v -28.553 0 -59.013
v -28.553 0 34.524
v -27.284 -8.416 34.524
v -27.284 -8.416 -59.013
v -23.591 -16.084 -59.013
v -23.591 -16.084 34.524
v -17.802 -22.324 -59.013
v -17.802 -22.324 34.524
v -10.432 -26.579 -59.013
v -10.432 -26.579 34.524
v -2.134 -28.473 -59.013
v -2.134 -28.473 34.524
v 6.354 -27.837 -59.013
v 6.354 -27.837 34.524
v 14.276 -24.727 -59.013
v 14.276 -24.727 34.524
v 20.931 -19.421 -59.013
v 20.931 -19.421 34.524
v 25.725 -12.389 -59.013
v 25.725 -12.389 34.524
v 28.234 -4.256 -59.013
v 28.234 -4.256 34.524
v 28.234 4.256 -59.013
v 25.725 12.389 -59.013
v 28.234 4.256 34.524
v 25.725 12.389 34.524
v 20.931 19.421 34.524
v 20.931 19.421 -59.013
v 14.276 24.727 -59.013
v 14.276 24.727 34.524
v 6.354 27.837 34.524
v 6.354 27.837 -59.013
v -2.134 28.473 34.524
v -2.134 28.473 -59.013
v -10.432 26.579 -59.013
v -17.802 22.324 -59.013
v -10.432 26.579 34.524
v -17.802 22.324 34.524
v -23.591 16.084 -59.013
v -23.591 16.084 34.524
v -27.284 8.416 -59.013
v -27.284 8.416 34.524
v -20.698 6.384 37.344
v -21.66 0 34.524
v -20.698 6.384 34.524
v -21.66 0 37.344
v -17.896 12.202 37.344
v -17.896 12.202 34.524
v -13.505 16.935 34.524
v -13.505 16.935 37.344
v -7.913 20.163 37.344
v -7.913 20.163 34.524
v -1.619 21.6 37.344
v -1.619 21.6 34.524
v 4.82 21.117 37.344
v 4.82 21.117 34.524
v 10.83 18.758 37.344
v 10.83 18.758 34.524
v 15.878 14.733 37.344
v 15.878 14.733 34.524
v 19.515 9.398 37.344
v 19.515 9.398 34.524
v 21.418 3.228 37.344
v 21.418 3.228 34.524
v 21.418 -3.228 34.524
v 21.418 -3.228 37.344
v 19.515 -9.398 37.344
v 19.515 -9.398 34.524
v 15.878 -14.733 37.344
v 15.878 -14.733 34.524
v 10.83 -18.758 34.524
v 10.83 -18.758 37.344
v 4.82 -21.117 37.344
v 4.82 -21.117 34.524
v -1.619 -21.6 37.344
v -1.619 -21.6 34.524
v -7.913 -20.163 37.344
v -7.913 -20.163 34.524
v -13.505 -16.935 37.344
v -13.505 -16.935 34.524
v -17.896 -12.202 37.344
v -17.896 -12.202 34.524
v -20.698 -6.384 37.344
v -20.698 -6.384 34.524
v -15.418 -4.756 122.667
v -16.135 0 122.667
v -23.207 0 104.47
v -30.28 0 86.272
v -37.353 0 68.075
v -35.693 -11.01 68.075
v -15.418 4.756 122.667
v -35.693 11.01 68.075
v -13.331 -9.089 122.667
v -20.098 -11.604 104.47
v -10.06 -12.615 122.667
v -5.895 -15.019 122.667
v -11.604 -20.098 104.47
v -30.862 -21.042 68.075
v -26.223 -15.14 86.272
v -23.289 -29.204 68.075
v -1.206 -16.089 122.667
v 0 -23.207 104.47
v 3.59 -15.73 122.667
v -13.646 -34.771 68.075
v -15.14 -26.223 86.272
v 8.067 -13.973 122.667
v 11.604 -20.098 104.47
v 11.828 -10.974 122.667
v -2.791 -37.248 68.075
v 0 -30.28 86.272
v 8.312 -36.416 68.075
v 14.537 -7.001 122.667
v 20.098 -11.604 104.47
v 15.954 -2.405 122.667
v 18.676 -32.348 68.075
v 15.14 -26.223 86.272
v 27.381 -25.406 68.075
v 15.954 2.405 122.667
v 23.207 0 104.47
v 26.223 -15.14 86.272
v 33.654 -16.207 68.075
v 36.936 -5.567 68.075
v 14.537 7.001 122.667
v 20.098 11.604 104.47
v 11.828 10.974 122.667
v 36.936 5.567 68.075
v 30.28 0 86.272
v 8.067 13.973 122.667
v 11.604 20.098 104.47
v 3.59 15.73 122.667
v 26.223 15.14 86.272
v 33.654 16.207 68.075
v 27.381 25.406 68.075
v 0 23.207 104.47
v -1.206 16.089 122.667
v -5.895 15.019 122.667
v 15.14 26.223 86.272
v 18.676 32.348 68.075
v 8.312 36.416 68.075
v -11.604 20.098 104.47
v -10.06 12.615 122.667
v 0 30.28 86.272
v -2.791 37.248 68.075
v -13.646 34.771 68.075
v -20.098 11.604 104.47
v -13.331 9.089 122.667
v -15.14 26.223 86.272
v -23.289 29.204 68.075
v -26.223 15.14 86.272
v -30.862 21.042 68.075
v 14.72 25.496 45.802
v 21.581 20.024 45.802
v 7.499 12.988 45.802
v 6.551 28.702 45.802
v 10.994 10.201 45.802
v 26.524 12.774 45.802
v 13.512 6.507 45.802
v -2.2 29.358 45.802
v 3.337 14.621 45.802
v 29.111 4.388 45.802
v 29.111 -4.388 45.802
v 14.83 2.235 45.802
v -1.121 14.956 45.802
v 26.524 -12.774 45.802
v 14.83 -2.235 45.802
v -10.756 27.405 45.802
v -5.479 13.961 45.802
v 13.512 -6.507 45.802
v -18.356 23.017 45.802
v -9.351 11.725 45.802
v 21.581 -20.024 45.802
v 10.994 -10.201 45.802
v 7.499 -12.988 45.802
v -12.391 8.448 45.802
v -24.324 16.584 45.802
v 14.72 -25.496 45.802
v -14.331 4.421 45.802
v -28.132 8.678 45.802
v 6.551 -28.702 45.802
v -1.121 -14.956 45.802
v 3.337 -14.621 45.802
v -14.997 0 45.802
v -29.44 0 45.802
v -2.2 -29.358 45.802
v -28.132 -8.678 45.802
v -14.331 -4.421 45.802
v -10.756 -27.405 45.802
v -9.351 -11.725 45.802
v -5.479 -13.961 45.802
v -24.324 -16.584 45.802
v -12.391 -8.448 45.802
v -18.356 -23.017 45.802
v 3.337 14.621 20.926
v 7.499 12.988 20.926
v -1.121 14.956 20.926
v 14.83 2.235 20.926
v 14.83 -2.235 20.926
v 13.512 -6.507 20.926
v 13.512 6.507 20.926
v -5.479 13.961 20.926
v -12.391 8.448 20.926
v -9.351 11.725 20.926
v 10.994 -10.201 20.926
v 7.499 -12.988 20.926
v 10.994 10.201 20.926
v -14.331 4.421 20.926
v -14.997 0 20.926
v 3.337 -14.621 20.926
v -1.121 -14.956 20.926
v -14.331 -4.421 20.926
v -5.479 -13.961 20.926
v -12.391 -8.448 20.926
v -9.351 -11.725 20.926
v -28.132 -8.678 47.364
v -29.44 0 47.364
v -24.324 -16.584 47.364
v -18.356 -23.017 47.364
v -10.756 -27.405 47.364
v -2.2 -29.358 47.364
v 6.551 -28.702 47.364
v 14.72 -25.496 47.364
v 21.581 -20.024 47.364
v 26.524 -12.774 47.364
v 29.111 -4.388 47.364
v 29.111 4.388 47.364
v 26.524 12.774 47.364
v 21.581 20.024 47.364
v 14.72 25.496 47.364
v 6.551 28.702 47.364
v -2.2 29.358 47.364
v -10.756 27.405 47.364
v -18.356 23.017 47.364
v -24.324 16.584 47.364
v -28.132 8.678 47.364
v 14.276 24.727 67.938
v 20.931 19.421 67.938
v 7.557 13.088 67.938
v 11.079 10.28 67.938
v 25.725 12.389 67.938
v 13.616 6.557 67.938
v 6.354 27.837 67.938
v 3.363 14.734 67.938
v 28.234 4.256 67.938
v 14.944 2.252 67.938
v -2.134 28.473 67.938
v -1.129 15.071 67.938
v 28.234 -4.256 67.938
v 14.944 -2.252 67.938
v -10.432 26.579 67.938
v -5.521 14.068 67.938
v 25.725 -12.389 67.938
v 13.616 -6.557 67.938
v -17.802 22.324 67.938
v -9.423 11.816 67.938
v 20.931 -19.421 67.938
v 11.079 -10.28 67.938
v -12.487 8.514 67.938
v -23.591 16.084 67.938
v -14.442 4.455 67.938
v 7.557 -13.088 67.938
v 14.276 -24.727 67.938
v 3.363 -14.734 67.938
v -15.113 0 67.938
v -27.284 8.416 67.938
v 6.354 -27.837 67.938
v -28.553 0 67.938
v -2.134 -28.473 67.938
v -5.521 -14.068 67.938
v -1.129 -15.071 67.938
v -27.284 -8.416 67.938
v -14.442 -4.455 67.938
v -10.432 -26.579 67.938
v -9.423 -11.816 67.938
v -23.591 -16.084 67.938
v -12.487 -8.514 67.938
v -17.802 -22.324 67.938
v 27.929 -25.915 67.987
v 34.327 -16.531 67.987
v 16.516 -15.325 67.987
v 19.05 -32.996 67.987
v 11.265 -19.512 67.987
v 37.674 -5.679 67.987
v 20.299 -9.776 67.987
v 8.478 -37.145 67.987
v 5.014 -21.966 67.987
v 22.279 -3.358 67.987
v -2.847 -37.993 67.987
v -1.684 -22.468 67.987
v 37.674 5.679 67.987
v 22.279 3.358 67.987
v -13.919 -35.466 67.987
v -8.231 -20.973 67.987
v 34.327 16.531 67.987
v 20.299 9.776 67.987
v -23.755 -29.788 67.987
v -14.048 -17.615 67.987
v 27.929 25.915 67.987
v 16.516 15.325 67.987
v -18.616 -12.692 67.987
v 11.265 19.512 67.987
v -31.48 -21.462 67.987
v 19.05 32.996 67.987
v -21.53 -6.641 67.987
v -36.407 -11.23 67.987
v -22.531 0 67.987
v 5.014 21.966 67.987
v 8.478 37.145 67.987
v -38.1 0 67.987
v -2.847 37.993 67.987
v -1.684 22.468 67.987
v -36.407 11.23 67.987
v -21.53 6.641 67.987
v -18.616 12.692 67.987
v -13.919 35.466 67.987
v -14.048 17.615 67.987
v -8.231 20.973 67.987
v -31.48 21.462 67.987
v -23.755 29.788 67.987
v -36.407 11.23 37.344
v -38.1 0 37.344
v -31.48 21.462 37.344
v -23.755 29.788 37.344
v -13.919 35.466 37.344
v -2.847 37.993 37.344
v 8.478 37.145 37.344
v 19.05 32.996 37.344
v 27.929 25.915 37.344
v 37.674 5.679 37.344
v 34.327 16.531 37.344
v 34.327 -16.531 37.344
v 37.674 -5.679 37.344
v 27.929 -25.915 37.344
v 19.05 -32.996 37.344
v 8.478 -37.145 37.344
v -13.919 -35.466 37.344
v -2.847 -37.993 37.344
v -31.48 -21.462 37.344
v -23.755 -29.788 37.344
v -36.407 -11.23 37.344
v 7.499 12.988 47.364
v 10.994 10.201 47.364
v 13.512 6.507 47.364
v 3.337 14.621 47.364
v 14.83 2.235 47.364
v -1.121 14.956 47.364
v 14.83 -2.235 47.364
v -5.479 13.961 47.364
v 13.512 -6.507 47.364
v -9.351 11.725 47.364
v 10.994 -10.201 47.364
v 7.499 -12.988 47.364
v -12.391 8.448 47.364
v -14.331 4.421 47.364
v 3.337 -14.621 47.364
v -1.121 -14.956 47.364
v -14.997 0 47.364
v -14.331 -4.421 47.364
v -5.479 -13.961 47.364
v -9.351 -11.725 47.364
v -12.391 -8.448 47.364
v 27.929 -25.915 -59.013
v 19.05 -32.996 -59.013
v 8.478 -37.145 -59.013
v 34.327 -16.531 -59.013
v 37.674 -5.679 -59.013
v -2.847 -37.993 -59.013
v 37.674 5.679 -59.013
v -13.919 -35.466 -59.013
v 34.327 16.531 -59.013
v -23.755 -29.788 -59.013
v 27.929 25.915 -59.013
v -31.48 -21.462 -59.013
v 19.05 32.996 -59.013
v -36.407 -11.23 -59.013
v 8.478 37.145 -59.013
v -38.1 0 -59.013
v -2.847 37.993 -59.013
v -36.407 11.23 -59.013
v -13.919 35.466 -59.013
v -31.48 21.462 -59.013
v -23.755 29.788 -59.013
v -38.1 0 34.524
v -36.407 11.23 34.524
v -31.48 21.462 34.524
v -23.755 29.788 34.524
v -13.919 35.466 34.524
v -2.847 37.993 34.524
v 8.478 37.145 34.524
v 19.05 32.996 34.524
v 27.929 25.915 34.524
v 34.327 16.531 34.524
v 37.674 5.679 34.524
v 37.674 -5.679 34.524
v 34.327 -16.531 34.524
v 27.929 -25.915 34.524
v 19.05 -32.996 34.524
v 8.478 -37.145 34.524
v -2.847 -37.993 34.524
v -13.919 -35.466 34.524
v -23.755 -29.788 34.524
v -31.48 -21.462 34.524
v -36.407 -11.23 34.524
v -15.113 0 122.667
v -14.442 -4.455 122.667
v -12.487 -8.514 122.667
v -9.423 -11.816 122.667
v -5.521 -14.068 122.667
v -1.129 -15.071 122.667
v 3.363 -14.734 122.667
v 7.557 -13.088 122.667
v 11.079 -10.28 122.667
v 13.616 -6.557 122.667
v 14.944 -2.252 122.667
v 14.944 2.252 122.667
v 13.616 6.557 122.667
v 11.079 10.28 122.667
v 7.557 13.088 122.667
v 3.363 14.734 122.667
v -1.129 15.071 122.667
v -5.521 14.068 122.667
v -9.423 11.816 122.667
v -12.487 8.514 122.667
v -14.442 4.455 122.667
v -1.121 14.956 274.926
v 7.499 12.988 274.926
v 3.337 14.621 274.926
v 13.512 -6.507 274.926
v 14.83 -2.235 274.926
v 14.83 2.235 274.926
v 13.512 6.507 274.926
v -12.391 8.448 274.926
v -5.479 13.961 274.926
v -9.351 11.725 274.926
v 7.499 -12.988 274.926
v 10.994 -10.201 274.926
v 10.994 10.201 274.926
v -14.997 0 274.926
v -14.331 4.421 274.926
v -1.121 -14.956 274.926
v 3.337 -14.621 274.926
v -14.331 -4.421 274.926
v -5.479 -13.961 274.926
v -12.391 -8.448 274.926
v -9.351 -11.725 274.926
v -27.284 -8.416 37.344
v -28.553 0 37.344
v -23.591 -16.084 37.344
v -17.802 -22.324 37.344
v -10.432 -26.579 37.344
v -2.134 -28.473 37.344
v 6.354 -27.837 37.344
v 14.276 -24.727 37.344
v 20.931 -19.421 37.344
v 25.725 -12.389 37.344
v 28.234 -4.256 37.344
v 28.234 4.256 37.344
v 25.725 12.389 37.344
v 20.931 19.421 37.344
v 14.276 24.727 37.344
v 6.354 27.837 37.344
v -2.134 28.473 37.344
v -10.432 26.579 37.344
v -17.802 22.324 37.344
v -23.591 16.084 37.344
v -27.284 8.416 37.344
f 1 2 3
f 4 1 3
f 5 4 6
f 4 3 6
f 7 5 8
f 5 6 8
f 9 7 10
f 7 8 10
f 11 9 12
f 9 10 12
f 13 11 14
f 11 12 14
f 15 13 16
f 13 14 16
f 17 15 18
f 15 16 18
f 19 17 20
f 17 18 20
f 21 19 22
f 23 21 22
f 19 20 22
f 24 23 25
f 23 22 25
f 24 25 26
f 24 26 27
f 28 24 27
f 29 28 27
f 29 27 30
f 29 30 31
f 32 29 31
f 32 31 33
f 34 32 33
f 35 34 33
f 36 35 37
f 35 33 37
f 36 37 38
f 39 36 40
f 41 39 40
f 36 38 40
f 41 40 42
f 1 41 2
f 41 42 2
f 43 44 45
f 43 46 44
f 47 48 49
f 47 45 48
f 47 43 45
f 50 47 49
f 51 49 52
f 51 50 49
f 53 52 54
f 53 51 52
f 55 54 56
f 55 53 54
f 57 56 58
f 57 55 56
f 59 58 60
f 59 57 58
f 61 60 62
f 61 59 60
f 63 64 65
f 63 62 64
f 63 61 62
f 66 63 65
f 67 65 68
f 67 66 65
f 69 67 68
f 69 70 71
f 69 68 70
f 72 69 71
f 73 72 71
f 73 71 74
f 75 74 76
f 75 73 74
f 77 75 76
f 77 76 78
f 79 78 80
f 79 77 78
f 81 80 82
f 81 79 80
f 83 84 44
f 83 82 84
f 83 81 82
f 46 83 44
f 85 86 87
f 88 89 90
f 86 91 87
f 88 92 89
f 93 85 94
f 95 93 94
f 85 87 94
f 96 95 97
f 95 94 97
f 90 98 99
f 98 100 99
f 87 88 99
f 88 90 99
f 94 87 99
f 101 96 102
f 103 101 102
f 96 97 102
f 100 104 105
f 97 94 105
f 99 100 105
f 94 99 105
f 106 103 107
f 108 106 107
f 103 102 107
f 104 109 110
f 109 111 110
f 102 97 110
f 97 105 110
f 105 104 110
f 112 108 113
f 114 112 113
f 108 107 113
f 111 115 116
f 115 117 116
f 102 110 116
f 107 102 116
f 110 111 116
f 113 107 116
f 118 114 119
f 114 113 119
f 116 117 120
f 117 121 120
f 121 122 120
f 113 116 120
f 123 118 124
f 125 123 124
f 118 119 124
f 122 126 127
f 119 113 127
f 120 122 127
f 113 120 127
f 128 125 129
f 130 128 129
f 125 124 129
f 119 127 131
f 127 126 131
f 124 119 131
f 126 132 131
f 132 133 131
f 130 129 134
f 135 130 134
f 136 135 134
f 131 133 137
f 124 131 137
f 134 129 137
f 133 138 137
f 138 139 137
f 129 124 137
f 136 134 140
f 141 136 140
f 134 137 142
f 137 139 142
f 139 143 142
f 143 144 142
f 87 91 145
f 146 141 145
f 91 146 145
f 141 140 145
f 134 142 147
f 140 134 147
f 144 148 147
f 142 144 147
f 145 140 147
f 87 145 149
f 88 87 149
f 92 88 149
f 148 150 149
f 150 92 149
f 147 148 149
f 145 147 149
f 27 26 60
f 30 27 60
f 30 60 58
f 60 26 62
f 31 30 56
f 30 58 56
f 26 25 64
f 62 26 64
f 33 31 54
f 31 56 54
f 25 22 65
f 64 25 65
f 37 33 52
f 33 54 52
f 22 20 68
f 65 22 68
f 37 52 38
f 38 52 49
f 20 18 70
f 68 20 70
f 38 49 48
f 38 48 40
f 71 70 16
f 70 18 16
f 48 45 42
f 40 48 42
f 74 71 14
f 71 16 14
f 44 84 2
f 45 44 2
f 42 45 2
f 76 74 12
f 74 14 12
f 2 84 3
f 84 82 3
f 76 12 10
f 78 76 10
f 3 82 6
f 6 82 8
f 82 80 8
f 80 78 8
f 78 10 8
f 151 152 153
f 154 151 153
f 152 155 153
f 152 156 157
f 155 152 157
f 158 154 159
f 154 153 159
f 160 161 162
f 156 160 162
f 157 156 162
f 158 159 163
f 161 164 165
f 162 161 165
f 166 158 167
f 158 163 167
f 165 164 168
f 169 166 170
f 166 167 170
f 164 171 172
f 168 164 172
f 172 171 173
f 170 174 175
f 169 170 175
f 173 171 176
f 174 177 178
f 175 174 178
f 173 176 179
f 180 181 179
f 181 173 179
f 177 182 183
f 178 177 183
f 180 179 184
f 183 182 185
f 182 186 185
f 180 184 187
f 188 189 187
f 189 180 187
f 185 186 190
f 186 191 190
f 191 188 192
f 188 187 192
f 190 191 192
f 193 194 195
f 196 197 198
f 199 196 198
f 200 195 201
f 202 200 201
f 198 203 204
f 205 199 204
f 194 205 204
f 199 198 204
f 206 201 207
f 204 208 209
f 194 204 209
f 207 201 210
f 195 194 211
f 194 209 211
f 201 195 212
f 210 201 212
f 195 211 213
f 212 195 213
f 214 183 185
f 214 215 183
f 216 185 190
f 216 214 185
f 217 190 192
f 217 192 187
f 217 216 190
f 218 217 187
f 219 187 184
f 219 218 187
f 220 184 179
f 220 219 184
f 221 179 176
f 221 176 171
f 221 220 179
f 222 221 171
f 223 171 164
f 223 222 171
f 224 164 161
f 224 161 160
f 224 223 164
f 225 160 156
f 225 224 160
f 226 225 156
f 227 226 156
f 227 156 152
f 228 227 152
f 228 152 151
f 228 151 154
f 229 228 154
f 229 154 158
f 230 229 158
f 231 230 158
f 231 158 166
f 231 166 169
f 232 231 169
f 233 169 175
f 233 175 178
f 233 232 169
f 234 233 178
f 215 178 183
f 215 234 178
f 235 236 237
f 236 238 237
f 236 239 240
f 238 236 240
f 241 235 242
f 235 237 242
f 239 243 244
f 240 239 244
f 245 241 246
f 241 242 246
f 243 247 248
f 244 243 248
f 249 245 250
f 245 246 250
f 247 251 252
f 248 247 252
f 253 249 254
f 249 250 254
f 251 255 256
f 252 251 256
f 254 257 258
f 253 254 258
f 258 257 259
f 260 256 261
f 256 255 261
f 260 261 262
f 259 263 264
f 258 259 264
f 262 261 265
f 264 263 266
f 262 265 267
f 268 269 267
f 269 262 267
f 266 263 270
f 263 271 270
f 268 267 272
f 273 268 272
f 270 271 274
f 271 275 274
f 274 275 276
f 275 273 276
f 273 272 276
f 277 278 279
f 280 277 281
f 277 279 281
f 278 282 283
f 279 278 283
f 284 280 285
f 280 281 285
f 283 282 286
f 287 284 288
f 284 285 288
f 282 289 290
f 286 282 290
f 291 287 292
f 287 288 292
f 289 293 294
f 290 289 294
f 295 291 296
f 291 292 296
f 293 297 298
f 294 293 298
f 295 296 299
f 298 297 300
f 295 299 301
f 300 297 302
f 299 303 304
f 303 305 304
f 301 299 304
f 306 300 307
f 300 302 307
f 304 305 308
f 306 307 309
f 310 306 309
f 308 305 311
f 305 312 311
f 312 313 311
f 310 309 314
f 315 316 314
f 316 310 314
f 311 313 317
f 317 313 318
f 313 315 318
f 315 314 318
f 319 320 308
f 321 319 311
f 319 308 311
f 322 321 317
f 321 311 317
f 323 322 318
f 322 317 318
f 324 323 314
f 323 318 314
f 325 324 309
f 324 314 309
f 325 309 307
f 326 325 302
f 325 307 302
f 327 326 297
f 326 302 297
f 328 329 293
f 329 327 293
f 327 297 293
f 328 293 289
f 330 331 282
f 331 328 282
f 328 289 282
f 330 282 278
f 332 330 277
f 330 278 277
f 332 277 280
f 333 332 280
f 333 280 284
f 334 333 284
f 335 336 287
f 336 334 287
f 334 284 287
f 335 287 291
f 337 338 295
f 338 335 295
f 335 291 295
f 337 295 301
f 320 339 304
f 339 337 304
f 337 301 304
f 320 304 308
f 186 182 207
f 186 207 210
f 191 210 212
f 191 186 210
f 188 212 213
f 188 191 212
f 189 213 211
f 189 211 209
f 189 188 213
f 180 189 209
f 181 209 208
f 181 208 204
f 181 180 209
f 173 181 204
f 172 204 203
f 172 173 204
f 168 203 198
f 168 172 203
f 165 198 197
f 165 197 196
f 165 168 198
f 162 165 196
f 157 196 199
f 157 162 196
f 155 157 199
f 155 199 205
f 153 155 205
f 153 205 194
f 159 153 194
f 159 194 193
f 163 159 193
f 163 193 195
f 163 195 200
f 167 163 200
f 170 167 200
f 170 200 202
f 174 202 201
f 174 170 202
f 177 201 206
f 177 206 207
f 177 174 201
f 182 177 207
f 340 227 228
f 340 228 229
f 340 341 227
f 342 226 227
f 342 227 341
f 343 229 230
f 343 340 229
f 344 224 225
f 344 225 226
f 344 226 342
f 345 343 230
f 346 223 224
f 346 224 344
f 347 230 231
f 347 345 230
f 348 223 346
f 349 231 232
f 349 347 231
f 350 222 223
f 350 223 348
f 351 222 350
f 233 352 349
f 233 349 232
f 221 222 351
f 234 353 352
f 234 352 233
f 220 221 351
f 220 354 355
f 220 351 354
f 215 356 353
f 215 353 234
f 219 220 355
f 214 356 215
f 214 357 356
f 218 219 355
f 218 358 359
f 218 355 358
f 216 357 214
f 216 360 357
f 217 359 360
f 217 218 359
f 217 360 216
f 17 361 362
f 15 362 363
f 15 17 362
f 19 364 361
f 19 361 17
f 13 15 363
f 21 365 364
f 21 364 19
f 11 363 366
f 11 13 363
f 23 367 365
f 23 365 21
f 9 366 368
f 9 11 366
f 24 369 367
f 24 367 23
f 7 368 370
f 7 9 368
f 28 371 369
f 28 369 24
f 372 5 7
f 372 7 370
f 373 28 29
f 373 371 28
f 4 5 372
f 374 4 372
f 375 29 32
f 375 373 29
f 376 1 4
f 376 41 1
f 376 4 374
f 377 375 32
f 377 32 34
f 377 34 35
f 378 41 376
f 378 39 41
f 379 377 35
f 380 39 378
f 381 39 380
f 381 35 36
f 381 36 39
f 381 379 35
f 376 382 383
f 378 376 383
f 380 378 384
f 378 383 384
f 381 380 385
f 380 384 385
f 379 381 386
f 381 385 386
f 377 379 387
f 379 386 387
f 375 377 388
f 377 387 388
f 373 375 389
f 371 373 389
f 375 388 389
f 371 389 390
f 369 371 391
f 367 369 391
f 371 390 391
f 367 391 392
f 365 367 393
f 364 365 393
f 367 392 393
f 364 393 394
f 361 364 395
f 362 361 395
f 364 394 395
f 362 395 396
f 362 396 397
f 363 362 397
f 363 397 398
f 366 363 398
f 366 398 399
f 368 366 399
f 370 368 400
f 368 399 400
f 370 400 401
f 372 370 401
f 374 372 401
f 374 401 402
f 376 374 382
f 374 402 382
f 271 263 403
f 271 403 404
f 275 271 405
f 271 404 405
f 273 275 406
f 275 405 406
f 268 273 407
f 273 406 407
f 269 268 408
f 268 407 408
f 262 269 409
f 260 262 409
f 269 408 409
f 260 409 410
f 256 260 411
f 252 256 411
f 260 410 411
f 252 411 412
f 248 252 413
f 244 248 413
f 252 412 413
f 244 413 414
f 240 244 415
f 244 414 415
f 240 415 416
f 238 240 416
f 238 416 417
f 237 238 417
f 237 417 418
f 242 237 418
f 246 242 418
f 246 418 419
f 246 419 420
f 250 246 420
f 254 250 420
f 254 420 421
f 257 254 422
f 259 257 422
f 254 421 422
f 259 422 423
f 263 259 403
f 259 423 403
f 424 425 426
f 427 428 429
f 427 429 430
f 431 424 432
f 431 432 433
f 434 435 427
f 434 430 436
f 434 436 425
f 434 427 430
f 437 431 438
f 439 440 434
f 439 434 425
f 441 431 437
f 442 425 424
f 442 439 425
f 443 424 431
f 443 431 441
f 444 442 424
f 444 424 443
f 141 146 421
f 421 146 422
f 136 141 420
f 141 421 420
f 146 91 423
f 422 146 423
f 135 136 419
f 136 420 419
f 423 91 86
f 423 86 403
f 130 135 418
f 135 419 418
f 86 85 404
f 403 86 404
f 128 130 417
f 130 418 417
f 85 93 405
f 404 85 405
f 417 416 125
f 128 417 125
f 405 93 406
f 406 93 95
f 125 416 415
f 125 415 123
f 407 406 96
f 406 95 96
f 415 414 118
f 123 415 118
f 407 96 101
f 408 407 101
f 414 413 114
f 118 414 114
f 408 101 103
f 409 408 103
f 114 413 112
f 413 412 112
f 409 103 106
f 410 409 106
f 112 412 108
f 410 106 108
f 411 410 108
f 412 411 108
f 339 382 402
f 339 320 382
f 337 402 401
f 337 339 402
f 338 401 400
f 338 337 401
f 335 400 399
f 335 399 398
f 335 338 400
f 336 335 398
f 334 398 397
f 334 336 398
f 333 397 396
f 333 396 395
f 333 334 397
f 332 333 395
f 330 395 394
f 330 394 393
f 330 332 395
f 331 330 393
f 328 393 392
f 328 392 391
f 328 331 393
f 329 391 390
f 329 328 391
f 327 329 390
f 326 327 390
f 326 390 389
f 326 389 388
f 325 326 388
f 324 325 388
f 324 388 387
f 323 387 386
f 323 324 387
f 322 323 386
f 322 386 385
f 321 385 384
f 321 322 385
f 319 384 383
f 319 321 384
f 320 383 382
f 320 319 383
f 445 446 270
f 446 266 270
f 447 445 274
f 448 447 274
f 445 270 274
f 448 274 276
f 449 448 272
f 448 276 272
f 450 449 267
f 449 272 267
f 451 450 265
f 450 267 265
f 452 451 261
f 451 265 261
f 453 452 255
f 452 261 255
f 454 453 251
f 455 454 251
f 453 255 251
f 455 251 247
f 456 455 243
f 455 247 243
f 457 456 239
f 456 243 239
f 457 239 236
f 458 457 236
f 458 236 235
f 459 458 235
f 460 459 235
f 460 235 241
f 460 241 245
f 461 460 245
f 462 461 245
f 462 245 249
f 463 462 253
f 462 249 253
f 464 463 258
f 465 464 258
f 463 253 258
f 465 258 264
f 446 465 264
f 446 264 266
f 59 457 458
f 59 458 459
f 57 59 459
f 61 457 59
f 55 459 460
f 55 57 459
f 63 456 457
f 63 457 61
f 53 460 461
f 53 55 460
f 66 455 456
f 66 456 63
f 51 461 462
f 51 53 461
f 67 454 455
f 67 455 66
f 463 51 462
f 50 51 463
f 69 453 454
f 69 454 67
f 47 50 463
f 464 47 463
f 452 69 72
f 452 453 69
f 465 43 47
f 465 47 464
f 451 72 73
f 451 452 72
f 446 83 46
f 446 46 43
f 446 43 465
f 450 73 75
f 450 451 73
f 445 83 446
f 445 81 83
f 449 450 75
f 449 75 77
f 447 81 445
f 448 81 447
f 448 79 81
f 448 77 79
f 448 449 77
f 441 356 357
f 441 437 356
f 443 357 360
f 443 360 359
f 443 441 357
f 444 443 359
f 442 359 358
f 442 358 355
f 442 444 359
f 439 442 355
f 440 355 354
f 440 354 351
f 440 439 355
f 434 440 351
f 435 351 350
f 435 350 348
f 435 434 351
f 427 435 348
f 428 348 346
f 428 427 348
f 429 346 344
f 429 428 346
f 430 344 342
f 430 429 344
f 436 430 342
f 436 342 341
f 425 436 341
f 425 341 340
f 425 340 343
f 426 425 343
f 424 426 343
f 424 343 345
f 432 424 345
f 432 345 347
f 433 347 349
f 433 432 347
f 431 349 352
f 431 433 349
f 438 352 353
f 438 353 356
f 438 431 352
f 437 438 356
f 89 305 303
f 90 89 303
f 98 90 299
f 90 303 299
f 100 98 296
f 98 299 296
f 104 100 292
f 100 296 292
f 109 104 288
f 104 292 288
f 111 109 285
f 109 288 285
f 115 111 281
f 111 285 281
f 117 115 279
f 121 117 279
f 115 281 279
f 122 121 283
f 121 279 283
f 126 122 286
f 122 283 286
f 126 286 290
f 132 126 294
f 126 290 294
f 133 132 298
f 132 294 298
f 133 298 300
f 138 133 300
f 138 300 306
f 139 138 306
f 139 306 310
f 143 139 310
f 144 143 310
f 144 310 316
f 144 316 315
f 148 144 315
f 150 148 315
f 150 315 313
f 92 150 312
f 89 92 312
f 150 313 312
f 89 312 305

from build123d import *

# Parameters (mm, degrees)
F0_W  = 38.1
F0_H  = 127
F4_W  = 15.1131534949
F4_H  = 210.3794142604
F6_W  = 28.5528358072
F6_H  = 138.149574399
F8_W  = 14.9974487722
F8_H  = 254
F12_W = 29.4399373233
F12_H = 1.5613138676
F14_W = 38.1
F14_H = 2.8206296265
F16_W = 21.6601658612
F16_H = 20.3340332955


# Not quite as in the source:
# - a feature of the source that left no trace in its solid (it failed there, or was rolled back) is left out


with BuildPart() as f1:
    # F0 (on Front) → F1 (revolve)
    with BuildSketch(Plane.XZ):
        with Locations((-19.05, 4.4871026874)):
            Rectangle(F0_W, F0_H)
    revolve(axis=Axis((0, 0, 4.4871026874), (0, 0, -1)))

    # F2 (on Front) → F3 (revolve)
    with BuildSketch(Plane.XZ):
        Polygon((-37.352733314, 68.0748075247), (0, 67.8537860513), (0, 122.6672679186), (-16.1346122622, 122.6672679186), align=None)
    revolve(axis=Axis((0, 0, 95.2605269849), (0, 0, 1)))

    # F4 (on Front) → F5 (revolve, cut)
    with BuildSketch(Plane.XZ):
        with Locations((-7.5565767474, 30.3173996508)):
            Rectangle(F4_W, F4_H)
    revolve(axis=Axis((0, 0, 30.3173996508), (0, 0, 1)), mode=Mode.SUBTRACT)

    # F6 (on Front) → F7 (revolve, cut)
    with BuildSketch(Plane.XZ):
        with Locations((-14.2764179036, -1.1372193694)):
            Rectangle(F6_W, F6_H)
    revolve(axis=Axis((0, 0, -1.1372193694), (0, 0, 1)), mode=Mode.SUBTRACT)

    # F14 (on Front) → F15 (revolve)
    with BuildSketch(Plane.XZ):
        with Locations((-19.05, 35.9340105206)):
            Rectangle(F14_W, F14_H)
    revolve(axis=Axis((0, 0, 35.9340105206), (0, 0, 1)))

    # F16 (on Front) → F17 (revolve, cut)
    with BuildSketch(Plane.XZ):
        with Locations((-10.8300829306, 32.0482039824)):
            Rectangle(F16_W, F16_H)
    revolve(axis=Axis((0, 0, 32.0482039824), (0, 0, -1)), mode=Mode.SUBTRACT)


with BuildPart() as f9:
    # F8 (on Front) → F9 (revolve)
    with BuildSketch(Plane.XZ):
        with Locations((-7.4987243861, 147.9263339639)):
            Rectangle(F8_W, F8_H)
    revolve(axis=Axis((0, 0, 147.9263339639), (0, 0, 1)))

    # F12 (on Front) → F13 (revolve)
    with BuildSketch(Plane.XZ):
        with Locations((-14.7199686617, 46.5829521418)):
            Rectangle(F12_W, F12_H)
    revolve(axis=Axis((0, 0, 46.5829521418), (0, 0, 1)))


solid = Compound([f1.part, f9.part])
